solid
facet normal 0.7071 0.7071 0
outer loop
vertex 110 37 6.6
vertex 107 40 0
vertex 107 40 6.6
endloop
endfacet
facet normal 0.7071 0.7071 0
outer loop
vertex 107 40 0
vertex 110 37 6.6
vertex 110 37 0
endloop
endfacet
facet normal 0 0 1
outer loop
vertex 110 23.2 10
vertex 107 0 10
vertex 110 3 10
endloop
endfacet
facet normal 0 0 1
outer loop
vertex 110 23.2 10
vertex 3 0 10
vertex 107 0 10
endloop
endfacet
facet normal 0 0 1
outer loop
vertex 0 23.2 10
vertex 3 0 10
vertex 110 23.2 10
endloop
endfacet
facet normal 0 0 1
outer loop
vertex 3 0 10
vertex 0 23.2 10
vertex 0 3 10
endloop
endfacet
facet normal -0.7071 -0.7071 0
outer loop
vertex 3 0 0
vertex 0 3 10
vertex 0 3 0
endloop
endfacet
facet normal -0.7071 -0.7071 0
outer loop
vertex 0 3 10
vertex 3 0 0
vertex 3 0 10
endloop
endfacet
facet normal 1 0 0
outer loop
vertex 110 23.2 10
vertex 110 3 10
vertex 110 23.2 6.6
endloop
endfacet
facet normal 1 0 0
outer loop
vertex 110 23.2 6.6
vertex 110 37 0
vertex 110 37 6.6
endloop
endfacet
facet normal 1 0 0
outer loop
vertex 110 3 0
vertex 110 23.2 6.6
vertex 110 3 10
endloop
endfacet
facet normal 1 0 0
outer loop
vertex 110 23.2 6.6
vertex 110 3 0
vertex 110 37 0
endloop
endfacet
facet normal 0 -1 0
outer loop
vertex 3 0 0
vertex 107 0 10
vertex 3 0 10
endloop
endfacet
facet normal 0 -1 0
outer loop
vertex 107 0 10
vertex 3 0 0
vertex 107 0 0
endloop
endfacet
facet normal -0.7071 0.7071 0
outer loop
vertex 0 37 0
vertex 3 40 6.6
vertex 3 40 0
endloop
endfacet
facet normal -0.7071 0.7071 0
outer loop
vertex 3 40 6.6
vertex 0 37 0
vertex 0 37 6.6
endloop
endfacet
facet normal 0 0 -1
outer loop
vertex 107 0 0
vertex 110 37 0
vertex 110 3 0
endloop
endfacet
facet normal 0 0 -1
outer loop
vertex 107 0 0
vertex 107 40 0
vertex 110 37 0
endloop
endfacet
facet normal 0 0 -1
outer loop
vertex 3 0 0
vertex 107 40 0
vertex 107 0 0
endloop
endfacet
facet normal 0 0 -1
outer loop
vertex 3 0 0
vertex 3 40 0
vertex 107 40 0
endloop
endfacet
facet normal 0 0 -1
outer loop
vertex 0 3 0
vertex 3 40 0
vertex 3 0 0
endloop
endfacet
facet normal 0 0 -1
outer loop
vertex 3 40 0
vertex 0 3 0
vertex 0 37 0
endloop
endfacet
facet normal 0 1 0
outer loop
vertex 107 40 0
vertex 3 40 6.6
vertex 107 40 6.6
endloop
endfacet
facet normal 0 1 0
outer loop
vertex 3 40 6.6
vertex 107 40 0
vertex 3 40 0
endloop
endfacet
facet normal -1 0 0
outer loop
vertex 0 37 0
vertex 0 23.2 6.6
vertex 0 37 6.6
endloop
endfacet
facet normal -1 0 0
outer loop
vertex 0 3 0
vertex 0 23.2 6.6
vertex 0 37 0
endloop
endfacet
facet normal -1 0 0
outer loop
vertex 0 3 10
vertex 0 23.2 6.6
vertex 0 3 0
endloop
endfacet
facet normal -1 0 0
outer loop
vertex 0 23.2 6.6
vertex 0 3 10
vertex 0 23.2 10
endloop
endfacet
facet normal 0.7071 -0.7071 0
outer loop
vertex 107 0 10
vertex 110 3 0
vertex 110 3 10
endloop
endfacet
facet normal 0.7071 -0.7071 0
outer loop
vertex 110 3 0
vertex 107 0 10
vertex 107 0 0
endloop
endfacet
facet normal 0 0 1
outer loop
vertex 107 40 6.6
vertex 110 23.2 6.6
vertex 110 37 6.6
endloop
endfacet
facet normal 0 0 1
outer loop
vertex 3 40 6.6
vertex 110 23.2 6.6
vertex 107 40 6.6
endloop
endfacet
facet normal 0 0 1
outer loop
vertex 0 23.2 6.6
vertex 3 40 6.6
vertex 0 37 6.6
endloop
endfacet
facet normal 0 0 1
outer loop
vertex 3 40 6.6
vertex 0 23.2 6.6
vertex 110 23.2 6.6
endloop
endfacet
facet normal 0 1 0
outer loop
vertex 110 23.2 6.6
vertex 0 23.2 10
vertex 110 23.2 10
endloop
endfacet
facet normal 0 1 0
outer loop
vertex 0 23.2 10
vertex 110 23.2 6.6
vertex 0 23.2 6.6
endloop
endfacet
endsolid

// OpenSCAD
$fn = 32;

// ----------------------------------------------------------------------
// Stepped bar: sidestep, 110 x 40 x 10/6.6 mm
// ----------------------------------------------------------------------

// --- parameters (mm) ---
bar_l = 110;              // bar length, X
bar_w = 40;               // bar width, Y
plate_t = 10;             // thickness of the thick zone, Z
thin_t = 6.6;             // thickness of the thin zone
corner_c = 3;             // corner chamfer of the bar
step_cut = 3.4;           // material removed from the thin zone
ledge_y = 23.2;           // start of the ledge from the front edge
depth_1 = 3.4;            // depth of cut 1 from the top face

profile = [[3, 0], [107, 0], [110, 3], [110, 37], [107, 40], [3, 40], [0, 37], [0, 3]];  // primary outline, 8 points, counter clockwise
void_1 = [[-1, 23.2], [111, 23.2], [111, 41], [-1, 41]];  // ledge cut along one edge, 4 points

// --- the one profile operation ---
difference() {
  linear_extrude(height = plate_t) polygon(points = profile);
  translate([0, 0, plate_t - depth_1])
    linear_extrude(height = depth_1 + 1) polygon(points = void_1);
}
